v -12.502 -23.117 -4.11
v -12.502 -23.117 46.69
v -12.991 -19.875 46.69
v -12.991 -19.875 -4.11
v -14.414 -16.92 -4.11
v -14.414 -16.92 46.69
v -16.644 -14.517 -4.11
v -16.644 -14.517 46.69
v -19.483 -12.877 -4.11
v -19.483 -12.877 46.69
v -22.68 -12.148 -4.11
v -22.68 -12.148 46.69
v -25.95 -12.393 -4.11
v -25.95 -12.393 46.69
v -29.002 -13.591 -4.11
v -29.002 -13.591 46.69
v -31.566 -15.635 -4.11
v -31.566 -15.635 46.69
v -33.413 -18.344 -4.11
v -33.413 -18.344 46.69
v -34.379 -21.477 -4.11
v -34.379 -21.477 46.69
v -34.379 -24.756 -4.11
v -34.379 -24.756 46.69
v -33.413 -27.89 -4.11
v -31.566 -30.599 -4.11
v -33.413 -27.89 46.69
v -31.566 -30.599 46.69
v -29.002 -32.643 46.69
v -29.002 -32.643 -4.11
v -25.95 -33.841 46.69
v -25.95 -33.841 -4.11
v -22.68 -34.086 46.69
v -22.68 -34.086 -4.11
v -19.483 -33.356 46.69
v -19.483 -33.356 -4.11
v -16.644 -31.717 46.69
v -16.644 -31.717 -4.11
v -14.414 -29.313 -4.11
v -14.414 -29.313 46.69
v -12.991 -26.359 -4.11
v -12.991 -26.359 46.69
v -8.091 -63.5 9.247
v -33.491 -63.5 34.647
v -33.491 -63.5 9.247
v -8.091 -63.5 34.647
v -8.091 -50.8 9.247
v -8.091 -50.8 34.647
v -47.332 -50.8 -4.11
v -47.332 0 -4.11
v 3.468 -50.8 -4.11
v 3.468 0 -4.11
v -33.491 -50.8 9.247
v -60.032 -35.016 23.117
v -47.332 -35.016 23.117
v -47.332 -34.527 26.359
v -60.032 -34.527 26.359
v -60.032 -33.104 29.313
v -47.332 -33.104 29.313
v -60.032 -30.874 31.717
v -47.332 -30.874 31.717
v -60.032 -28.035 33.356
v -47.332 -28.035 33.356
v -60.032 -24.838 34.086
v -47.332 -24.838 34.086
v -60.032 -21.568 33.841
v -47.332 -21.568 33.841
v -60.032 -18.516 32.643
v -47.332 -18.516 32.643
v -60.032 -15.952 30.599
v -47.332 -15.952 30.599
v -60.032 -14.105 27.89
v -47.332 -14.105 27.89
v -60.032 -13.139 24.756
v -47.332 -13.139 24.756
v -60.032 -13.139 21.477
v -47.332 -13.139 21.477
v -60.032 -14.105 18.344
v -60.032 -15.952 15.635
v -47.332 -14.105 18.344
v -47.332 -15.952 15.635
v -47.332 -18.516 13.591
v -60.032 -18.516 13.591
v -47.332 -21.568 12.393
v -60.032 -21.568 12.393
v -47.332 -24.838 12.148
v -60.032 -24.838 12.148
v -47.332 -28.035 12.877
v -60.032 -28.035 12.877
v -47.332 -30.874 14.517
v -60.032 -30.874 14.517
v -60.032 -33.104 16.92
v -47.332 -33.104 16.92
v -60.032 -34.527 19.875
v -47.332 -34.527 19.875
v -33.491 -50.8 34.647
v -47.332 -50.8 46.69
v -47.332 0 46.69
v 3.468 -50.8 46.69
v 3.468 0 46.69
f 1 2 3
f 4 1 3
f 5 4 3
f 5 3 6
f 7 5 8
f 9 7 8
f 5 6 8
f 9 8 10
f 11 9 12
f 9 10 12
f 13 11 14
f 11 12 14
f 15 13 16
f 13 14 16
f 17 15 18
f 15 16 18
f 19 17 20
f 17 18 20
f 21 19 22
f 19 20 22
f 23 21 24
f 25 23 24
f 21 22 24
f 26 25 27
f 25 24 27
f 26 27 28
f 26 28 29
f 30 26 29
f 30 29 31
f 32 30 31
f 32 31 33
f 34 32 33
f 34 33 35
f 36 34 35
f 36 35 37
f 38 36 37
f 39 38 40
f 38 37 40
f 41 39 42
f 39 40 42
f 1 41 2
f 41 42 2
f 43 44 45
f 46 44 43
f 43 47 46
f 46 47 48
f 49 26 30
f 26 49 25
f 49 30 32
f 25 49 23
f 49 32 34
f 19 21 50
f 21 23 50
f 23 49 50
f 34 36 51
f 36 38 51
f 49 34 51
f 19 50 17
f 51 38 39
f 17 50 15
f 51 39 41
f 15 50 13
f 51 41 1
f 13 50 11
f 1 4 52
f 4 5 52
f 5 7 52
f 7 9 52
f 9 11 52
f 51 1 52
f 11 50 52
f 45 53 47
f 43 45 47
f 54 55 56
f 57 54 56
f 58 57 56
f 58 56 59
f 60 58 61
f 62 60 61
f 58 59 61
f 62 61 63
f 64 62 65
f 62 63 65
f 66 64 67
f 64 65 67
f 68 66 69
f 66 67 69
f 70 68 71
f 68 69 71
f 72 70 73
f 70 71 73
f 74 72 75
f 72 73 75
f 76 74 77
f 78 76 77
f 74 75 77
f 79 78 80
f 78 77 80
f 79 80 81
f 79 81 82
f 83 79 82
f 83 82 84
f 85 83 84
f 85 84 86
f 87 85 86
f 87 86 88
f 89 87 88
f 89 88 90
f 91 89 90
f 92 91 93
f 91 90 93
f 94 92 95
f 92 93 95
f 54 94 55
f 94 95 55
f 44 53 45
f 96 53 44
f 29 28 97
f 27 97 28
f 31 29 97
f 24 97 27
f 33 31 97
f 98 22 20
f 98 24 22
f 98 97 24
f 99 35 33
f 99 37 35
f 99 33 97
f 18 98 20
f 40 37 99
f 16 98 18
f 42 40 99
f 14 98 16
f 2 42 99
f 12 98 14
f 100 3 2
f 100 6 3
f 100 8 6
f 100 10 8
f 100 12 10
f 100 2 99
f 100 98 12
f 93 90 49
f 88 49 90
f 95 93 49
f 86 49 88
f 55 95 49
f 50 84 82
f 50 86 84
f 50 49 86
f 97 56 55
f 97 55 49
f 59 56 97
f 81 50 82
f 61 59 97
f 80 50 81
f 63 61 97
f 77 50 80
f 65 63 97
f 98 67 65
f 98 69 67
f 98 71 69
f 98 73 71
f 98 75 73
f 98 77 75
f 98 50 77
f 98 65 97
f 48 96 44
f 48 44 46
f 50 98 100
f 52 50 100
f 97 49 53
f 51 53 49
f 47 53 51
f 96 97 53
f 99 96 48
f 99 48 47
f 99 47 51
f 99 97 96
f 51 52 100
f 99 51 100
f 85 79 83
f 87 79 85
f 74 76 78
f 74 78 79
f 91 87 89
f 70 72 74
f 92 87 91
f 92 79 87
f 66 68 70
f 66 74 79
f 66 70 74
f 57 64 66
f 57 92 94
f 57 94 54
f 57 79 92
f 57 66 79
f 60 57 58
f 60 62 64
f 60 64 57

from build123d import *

# Parameters (mm, degrees)
F0_W     = 50.8
F0_H     = 50.8
F1_DEPTH = 50.8
F2_W     = 25.4
F2_H     = 25.4
F3_DEPTH = 12.7
F4_R     = 11
F5_DEPTH = 50.8
F6_R     = 11
F7_DEPTH = 12.7


with BuildPart() as f1:
    # F0 (on Front) → F1 (new body)
    with BuildSketch(Plane.XZ):
        with Locations((-21.93247, 21.290337)):
            Rectangle(F0_W, F0_H)
    extrude(amount=F1_DEPTH)

    # F2 (on face) → F3 (join)
    with BuildSketch(Plane.XZ.offset(50.8)):
        with Locations((-20.790899, 21.946741)):
            Rectangle(F2_W, F2_H)
    extrude(amount=F3_DEPTH)

    # F4 (on face) → F5 (cut)
    with BuildSketch(Plane.XY.offset(46.690337)):
        with Locations((-23.502136, -23.116853)):
            Circle(F4_R)
    extrude(amount=-F5_DEPTH, mode=Mode.SUBTRACT)

    # F6 (on face) → F7 (join)
    with BuildSketch(Plane(origin=(-47.33247, 0, 0), x_dir=(0, -1, 0), z_dir=(-1, 0, 0))):
        with Locations((24.015844, 23.116853)):
            Circle(F6_R)
    extrude(amount=F7_DEPTH)


solid = f1.part
